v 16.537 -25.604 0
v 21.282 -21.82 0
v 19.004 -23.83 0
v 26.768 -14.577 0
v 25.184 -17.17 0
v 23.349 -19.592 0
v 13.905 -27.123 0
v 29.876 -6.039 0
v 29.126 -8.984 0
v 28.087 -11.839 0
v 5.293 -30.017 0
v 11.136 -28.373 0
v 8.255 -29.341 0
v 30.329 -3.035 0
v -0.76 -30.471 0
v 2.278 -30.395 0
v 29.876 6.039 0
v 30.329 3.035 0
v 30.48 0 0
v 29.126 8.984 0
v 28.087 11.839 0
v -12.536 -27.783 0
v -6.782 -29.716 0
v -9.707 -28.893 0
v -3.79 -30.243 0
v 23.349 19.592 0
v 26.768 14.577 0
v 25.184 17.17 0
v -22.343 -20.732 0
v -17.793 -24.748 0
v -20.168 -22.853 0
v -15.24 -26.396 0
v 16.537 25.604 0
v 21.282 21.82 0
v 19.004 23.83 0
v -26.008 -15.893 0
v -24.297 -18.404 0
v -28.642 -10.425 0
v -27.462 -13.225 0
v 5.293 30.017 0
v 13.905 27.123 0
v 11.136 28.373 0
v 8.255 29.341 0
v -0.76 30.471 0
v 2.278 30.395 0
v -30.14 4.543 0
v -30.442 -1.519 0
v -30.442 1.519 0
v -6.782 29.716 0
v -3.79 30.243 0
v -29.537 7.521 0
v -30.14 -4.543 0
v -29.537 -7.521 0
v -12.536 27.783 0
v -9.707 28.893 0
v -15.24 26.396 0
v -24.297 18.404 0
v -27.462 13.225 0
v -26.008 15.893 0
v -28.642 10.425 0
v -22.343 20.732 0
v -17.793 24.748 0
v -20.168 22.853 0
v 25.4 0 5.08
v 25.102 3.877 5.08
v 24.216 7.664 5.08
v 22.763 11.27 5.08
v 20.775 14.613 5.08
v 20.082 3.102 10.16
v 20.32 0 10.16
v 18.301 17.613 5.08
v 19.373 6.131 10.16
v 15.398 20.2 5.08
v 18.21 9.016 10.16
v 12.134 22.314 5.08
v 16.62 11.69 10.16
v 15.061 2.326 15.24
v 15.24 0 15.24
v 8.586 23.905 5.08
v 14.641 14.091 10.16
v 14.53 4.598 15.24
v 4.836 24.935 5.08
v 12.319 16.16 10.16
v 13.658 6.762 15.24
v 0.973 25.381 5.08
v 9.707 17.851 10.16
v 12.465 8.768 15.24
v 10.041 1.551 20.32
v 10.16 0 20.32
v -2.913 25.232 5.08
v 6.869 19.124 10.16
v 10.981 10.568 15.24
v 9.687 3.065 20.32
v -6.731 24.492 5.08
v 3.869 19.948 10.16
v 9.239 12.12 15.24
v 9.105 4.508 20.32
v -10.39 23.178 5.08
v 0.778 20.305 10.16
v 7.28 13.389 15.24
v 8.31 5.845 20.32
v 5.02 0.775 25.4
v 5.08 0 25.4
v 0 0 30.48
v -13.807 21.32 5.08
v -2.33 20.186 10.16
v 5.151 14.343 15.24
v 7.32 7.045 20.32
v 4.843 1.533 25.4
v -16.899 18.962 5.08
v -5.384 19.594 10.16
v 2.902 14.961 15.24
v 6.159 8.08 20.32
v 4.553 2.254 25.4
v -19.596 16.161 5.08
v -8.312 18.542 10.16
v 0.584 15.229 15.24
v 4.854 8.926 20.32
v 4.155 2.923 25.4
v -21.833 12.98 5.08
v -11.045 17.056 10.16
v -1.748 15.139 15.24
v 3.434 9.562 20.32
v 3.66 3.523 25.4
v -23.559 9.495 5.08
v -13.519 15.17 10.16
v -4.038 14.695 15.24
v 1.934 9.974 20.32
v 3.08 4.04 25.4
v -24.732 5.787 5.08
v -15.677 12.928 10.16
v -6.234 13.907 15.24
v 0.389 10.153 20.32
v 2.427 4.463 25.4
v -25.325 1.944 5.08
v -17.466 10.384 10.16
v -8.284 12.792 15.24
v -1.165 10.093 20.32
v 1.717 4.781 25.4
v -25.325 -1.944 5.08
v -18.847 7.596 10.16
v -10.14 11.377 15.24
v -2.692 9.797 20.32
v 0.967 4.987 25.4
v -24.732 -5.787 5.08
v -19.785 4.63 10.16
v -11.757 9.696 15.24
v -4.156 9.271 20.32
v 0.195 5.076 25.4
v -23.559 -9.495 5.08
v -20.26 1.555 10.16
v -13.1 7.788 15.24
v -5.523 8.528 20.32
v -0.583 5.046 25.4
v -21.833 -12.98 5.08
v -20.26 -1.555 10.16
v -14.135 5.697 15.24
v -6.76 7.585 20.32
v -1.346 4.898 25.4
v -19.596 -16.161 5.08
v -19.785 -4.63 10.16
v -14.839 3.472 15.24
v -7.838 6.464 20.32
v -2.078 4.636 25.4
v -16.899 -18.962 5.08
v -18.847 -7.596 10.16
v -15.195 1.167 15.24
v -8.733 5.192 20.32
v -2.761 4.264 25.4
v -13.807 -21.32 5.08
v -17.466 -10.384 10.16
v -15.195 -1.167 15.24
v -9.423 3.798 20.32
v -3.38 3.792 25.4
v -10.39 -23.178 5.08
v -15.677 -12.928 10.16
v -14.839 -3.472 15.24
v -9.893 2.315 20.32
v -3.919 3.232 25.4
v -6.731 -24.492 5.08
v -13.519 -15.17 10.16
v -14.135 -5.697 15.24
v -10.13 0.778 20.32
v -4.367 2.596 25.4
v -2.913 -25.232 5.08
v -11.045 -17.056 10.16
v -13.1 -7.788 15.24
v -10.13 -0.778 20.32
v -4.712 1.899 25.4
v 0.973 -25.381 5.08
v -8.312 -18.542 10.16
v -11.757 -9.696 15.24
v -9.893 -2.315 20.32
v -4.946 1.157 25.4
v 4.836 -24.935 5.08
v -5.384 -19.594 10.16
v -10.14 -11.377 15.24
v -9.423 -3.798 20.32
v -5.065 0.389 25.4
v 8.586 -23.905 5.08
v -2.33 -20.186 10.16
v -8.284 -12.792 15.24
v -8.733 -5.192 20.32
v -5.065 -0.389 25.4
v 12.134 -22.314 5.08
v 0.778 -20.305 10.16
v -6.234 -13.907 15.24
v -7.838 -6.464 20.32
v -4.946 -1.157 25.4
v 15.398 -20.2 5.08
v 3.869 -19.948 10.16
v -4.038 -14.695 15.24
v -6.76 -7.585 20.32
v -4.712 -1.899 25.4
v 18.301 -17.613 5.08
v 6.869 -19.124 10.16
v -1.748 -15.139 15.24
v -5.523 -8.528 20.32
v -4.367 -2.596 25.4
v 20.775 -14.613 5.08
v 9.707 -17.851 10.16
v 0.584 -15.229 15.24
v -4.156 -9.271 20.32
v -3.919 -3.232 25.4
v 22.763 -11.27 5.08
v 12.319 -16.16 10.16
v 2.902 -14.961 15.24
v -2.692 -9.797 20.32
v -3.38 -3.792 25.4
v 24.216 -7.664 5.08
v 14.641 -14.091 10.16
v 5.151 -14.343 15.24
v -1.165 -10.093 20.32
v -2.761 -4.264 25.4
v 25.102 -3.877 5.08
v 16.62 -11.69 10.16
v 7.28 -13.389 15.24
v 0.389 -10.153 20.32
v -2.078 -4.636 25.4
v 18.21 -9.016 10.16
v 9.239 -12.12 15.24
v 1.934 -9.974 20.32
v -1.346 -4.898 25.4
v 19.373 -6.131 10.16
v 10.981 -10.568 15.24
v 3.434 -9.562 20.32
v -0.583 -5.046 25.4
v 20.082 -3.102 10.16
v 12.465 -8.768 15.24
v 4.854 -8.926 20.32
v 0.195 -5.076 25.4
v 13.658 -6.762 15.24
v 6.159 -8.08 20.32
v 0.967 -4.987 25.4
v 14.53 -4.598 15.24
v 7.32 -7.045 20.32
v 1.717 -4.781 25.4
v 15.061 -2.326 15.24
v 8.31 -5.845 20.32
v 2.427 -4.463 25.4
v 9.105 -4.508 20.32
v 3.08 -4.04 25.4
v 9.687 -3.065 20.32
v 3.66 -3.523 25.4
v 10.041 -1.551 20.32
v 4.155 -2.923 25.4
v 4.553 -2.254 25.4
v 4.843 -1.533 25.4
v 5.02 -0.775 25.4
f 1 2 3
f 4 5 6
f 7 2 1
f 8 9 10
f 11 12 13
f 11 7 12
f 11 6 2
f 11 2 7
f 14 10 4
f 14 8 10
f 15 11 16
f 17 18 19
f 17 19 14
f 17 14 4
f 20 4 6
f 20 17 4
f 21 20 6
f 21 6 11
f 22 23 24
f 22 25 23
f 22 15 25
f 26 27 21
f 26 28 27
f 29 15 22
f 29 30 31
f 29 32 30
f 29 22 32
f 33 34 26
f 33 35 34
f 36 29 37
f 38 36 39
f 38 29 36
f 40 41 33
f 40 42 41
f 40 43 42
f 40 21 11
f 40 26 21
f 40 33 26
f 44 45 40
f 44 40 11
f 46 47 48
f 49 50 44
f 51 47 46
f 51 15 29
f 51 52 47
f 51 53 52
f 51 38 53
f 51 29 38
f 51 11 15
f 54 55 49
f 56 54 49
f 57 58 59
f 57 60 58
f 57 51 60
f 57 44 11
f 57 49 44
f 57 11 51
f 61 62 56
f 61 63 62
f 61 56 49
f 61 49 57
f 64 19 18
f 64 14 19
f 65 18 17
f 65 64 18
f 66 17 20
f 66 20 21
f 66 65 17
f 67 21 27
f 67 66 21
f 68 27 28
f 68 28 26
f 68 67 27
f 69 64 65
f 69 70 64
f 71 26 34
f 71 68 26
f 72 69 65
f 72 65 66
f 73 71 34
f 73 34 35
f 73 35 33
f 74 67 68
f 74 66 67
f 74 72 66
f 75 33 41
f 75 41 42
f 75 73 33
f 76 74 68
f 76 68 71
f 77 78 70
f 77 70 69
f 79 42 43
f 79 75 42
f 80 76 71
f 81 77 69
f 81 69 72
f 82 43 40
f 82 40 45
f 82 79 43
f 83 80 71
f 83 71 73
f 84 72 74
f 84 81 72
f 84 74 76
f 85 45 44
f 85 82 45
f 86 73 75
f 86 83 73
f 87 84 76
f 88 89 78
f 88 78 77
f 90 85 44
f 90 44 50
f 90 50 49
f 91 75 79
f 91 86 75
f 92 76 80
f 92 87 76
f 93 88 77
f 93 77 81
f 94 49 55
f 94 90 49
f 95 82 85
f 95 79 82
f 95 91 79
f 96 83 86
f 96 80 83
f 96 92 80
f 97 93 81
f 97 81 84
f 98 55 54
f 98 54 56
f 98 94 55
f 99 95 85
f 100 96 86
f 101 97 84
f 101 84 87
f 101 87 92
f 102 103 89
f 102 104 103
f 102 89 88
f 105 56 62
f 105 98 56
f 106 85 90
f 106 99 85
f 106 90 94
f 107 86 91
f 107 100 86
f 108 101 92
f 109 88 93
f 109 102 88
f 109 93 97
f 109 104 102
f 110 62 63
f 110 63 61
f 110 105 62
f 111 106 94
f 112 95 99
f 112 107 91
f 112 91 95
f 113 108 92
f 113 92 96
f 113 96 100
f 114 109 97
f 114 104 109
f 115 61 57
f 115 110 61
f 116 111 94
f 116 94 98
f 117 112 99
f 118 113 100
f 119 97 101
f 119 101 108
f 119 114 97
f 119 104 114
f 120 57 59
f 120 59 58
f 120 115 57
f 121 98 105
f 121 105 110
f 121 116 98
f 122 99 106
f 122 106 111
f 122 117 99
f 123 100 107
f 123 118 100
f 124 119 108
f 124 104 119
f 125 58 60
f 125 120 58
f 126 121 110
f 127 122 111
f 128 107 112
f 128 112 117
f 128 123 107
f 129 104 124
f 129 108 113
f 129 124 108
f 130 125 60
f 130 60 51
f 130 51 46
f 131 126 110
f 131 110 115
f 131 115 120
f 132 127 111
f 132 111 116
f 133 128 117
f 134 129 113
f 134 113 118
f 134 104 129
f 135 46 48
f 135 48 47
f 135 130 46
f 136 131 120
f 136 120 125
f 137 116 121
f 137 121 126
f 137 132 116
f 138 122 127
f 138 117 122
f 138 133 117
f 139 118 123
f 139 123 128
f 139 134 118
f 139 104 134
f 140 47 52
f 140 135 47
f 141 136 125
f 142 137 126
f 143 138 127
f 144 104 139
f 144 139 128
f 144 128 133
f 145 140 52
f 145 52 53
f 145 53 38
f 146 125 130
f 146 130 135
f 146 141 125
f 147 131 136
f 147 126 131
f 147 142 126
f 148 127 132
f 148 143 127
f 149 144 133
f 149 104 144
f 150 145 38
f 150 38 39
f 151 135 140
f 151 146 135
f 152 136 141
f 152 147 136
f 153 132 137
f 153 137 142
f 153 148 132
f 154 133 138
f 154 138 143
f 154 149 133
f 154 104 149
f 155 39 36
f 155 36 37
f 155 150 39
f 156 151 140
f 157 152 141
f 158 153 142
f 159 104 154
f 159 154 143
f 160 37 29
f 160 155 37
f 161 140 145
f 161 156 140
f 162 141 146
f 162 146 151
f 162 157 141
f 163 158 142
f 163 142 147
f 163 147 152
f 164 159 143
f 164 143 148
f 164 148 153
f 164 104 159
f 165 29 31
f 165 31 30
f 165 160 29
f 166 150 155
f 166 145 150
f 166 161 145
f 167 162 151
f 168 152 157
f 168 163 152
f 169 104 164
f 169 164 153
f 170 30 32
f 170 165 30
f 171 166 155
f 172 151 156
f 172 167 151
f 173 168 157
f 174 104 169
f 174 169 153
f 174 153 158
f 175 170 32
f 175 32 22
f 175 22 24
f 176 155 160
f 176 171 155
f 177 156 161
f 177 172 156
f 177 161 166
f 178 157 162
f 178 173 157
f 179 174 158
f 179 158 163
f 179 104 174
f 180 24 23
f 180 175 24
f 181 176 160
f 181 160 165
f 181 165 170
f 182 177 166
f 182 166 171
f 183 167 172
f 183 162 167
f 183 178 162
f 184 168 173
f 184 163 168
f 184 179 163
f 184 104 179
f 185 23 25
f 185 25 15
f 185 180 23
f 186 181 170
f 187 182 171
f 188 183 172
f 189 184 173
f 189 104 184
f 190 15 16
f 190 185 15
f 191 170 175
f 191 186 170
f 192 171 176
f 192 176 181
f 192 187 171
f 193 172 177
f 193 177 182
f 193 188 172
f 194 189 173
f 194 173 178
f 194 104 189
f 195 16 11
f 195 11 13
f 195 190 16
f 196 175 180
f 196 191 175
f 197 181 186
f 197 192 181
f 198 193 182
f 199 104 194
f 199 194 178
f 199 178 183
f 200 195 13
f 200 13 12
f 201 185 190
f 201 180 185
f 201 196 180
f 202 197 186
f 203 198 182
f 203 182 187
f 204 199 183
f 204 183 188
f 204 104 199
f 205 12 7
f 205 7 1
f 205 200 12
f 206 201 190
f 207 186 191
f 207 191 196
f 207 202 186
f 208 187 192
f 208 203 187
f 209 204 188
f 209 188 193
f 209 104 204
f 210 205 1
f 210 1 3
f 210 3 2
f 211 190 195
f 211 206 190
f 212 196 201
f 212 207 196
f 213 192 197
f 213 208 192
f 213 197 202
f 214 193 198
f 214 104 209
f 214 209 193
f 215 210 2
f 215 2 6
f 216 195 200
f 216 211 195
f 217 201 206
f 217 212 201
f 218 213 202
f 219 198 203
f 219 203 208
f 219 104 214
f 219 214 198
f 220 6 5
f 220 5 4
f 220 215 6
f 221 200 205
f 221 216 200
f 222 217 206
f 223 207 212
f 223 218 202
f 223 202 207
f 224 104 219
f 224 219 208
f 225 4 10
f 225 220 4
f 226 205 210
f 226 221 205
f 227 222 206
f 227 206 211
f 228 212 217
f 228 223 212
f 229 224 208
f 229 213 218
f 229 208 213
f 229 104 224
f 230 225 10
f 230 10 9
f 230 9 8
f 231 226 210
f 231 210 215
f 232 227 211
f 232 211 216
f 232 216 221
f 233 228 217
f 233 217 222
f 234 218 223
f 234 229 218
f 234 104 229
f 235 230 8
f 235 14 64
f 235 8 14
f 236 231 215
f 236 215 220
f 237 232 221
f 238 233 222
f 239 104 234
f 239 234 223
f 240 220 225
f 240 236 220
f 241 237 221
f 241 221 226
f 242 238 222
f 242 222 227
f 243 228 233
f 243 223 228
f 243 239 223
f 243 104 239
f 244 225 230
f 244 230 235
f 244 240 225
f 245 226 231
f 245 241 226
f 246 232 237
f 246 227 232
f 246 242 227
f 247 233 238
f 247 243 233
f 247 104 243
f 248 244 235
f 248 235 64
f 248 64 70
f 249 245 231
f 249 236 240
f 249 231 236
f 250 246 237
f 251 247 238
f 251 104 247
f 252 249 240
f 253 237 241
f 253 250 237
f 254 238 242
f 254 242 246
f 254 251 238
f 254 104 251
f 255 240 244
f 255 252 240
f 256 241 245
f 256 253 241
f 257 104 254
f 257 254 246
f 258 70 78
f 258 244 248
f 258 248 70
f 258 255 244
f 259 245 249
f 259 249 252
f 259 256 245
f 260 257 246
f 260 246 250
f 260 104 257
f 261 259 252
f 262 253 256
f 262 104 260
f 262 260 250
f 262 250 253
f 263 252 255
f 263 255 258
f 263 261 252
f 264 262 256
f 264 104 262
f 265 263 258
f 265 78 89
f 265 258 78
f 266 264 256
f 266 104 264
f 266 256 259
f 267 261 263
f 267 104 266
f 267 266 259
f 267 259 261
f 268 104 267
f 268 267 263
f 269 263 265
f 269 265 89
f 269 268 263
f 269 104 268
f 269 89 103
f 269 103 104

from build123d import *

# Parameters (mm, degrees)
F2_R     = 15.24
F3_DEPTH = 30.48


with BuildPart() as f1:
    # F0 (on Front) → F1 (revolve)
    with BuildSketch(Plane.XZ):
        Polygon((0, 30.48), (0, 0), (30.48, 0), align=None)
    revolve(axis=Axis((0, 0, 15.24), (0, 0, 1)))


with BuildPart() as f3:
    # F2 (on Top) → F3 (new body)
    with BuildSketch(Plane.XY):
        with Locations((-47.422264, -15.657526)):
            Circle(F2_R)
    extrude(amount=F3_DEPTH)


solid = f1.part
